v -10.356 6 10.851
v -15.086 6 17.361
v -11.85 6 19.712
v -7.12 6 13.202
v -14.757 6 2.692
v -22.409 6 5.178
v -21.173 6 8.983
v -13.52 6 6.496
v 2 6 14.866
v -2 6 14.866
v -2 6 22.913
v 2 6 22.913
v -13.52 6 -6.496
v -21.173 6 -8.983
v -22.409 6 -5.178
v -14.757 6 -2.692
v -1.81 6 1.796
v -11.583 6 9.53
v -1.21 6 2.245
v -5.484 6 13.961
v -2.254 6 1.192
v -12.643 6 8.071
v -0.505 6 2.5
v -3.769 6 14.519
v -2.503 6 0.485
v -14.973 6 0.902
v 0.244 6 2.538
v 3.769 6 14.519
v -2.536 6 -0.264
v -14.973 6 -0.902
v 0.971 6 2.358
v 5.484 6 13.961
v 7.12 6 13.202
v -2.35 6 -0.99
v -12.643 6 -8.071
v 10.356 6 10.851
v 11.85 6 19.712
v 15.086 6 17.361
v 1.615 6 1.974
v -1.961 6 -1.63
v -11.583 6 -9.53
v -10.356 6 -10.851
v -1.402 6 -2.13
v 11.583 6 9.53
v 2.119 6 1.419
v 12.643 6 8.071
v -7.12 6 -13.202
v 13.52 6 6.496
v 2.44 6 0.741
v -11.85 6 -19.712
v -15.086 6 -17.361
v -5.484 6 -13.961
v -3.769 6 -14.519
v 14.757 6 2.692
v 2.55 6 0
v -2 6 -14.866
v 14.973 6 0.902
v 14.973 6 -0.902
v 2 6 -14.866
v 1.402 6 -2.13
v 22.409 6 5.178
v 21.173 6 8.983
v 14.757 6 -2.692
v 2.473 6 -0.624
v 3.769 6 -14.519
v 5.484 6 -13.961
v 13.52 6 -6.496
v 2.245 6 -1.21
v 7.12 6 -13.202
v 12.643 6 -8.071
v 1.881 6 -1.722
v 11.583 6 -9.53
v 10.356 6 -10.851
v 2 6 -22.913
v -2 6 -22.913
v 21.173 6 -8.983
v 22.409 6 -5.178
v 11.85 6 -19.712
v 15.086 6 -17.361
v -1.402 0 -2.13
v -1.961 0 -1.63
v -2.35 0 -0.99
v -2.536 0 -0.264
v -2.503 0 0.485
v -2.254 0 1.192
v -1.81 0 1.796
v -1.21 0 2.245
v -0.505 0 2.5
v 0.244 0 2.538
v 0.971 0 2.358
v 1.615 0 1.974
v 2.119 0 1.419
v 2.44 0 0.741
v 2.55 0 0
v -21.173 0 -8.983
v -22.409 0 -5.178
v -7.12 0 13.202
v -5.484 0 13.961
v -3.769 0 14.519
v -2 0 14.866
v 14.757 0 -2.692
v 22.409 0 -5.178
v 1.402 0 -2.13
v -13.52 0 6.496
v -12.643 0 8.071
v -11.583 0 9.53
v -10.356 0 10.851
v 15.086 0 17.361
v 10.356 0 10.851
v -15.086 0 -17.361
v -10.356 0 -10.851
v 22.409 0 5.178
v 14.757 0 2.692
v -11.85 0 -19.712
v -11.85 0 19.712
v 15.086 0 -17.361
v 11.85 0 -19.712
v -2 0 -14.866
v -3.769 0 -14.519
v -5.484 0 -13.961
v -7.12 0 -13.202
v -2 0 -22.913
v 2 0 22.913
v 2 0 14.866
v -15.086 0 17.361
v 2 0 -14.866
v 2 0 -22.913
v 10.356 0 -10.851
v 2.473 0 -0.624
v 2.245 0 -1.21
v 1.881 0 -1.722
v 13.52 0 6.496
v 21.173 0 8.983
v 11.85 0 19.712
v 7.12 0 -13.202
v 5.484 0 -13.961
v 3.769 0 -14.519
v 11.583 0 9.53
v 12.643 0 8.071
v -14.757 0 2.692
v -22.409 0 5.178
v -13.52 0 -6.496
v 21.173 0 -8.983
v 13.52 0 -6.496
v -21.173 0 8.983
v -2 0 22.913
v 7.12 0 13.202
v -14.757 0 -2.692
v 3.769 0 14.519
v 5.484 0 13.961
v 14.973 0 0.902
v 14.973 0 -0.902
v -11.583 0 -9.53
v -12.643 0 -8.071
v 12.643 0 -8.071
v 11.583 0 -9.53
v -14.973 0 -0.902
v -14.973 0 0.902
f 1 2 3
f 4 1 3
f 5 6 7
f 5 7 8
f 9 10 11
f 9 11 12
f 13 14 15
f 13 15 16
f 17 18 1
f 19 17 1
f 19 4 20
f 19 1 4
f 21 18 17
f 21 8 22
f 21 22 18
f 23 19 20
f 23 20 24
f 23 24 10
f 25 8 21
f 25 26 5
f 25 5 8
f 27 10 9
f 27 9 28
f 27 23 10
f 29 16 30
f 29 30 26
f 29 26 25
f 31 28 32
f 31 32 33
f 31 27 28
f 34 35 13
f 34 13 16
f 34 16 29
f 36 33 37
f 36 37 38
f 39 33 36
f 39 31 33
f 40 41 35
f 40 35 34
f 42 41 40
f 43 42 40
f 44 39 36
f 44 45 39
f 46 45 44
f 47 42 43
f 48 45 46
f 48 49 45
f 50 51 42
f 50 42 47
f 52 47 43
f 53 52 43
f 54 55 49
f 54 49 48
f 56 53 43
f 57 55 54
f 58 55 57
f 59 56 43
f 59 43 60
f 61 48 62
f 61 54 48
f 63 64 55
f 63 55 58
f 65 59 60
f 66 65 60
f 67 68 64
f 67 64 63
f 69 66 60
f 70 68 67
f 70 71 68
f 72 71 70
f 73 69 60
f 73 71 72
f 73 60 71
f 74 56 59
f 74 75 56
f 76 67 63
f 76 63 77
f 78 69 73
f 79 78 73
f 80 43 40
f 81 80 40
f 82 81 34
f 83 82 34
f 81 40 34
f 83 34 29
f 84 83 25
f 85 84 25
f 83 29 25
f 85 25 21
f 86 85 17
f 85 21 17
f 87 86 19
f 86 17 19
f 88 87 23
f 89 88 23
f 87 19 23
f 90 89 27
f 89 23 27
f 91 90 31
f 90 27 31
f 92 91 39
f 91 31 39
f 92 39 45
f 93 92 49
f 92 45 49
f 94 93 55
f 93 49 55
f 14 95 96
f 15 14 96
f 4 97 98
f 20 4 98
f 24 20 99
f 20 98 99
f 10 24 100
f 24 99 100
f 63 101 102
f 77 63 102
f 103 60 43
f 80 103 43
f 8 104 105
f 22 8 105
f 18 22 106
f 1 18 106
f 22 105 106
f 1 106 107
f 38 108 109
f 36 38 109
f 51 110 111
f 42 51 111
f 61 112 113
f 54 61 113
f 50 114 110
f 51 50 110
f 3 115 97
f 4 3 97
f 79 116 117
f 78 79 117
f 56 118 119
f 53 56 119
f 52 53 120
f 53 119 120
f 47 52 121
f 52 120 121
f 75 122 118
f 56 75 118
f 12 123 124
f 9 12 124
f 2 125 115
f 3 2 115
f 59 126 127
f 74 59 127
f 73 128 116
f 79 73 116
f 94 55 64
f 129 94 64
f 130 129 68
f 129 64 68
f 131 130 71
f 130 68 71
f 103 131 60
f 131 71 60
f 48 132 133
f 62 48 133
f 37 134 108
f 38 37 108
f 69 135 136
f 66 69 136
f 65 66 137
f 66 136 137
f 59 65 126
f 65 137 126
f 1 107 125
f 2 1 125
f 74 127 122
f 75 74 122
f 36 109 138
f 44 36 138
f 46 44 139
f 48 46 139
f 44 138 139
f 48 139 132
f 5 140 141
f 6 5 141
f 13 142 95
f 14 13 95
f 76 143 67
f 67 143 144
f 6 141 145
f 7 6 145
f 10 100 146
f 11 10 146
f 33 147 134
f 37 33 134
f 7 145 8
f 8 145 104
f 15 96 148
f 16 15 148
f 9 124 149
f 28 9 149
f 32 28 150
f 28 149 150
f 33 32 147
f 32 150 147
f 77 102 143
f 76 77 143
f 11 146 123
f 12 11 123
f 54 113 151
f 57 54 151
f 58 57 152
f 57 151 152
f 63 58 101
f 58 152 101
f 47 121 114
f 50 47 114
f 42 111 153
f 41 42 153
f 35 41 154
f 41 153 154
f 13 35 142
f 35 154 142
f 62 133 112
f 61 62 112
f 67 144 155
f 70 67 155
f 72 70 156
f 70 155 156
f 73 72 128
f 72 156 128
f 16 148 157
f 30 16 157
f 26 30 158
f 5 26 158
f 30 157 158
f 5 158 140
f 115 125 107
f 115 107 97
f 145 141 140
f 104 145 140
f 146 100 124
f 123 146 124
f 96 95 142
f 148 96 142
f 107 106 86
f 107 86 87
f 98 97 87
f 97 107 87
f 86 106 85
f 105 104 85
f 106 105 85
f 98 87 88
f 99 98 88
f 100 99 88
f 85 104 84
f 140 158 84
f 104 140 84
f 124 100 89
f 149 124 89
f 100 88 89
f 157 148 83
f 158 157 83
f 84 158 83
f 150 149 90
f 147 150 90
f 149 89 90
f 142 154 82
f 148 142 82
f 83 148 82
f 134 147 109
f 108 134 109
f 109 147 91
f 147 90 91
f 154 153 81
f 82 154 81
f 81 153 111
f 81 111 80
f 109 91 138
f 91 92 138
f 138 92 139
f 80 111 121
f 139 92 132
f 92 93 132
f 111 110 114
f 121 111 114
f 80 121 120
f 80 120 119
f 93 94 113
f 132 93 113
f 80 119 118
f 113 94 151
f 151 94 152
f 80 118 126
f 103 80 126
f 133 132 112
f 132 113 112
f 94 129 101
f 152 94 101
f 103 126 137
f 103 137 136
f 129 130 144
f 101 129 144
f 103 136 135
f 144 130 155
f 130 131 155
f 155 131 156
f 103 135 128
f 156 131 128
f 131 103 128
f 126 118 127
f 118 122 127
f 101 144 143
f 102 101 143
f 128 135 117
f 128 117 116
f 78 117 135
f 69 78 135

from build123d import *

# Parameters (mm, degrees)
SKETCH1_R           = 15
BOSS_EXTRUDE1_DEPTH = 6
CUT_EXTRUDE1_DEPTH  = 6


with BuildPart() as part:
    # Sketch1 → Boss-Extrude1 (new body)
    with BuildSketch(Plane(origin=(0, 0, 0), x_dir=(1, 0, 0), z_dir=(0, 1, 0))):
        with BuildLine():
            Line((-7.12002198, 13.202472761), (-11.849818066, 19.712478581))
            Line((-11.849818066, 19.712478581), (-15.085886044, 17.361337572))
            Line((-15.085886044, 17.361337572), (-10.356089958, 10.851331752))
            ThreePointArc((-10.356089958, 10.851331752), (-8.816778784, 12.135254916), (-7.12002198, 13.202472761))
        make_face()
        with BuildLine():
            Line((2, 22.912878475), (-2, 22.912878475))
            Line((-2, 22.912878475), (-2, 14.866068747))
            ThreePointArc((-2, 14.866068747), (0, 15), (2, 14.866068747))
            Line((2, 14.866068747), (2, 22.912878475))
        make_face()
        with BuildLine():
            Line((15.085886044, 17.361337572), (11.849818066, 19.712478581))
            Line((11.849818066, 19.712478581), (7.12002198, 13.202472761))
            ThreePointArc((7.12002198, 13.202472761), (8.816778784, 12.135254916), (10.356089958, 10.851331752))
            Line((10.356089958, 10.851331752), (15.085886044, 17.361337572))
        make_face()
        with BuildLine():
            Line((22.409476369, 5.178355806), (21.173408392, 8.982581871))
            Line((21.173408392, 8.982581871), (13.520437565, 6.495980915))
            ThreePointArc((13.520437565, 6.495980915), (14.265847744, 4.635254916), (14.756505543, 2.69175485))
            Line((14.756505543, 2.69175485), (22.409476369, 5.178355806))
        make_face()
        Circle(SKETCH1_R)
        with BuildLine():
            Line((21.173408392, -8.982581871), (22.409476369, -5.178355806))
            Line((22.409476369, -5.178355806), (14.756505543, -2.69175485))
            ThreePointArc((14.756505543, -2.69175485), (14.265847744, -4.635254916), (13.520437565, -6.495980915))
            Line((13.520437565, -6.495980915), (21.173408392, -8.982581871))
        make_face()
        with BuildLine():
            Line((11.849818066, -19.712478581), (15.085886044, -17.361337572))
            Line((15.085886044, -17.361337572), (10.356089958, -10.851331752))
            ThreePointArc((10.356089958, -10.851331752), (8.816778784, -12.135254916), (7.12002198, -13.202472761))
            Line((7.12002198, -13.202472761), (11.849818066, -19.712478581))
        make_face()
        with BuildLine():
            Line((-2, -14.866068747), (-2, -22.912878475))
            Line((-2, -22.912878475), (2, -22.912878475))
            Line((2, -22.912878475), (2, -14.866068747))
            ThreePointArc((2, -14.866068747), (0, -15), (-2, -14.866068747))
        make_face()
        with BuildLine():
            Line((-10.356089958, -10.851331752), (-15.085886044, -17.361337572))
            Line((-15.085886044, -17.361337572), (-11.849818066, -19.712478581))
            Line((-11.849818066, -19.712478581), (-7.12002198, -13.202472761))
            ThreePointArc((-7.12002198, -13.202472761), (-8.816778784, -12.135254916), (-10.356089958, -10.851331752))
        make_face()
        with BuildLine():
            Line((-14.756505543, -2.69175485), (-22.409476369, -5.178355806))
            Line((-22.409476369, -5.178355806), (-21.173408392, -8.982581871))
            Line((-21.173408392, -8.982581871), (-13.520437565, -6.495980915))
            ThreePointArc((-13.520437565, -6.495980915), (-14.265847744, -4.635254916), (-14.756505543, -2.69175485))
        make_face()
        with BuildLine():
            Line((-13.520437565, 6.495980915), (-21.173408392, 8.982581871))
            Line((-21.173408392, 8.982581871), (-22.409476369, 5.178355806))
            Line((-22.409476369, 5.178355806), (-14.756505543, 2.69175485))
            ThreePointArc((-14.756505543, 2.69175485), (-14.265847744, 4.635254916), (-13.520437565, 6.495980915))
        make_face()
    extrude(amount=BOSS_EXTRUDE1_DEPTH)

    # Sketch2 → Cut-Extrude1 (cut)
    with BuildSketch(Plane(origin=(0, 6, 0), x_dir=(1, 0, 0), z_dir=(0, 1, 0))):
        with BuildLine():
            Line((1.401998573, 2.13), (-1.401998573, 2.13))
            ThreePointArc((-1.401998573, 2.13), (-1.209835451, -2.24472675), (2.55, 0))
            ThreePointArc((2.55, 0), (2.24472675, 1.209835451), (1.401998573, 2.13))
        make_face()
    extrude(amount=-CUT_EXTRUDE1_DEPTH, mode=Mode.SUBTRACT)


solid = part.part
